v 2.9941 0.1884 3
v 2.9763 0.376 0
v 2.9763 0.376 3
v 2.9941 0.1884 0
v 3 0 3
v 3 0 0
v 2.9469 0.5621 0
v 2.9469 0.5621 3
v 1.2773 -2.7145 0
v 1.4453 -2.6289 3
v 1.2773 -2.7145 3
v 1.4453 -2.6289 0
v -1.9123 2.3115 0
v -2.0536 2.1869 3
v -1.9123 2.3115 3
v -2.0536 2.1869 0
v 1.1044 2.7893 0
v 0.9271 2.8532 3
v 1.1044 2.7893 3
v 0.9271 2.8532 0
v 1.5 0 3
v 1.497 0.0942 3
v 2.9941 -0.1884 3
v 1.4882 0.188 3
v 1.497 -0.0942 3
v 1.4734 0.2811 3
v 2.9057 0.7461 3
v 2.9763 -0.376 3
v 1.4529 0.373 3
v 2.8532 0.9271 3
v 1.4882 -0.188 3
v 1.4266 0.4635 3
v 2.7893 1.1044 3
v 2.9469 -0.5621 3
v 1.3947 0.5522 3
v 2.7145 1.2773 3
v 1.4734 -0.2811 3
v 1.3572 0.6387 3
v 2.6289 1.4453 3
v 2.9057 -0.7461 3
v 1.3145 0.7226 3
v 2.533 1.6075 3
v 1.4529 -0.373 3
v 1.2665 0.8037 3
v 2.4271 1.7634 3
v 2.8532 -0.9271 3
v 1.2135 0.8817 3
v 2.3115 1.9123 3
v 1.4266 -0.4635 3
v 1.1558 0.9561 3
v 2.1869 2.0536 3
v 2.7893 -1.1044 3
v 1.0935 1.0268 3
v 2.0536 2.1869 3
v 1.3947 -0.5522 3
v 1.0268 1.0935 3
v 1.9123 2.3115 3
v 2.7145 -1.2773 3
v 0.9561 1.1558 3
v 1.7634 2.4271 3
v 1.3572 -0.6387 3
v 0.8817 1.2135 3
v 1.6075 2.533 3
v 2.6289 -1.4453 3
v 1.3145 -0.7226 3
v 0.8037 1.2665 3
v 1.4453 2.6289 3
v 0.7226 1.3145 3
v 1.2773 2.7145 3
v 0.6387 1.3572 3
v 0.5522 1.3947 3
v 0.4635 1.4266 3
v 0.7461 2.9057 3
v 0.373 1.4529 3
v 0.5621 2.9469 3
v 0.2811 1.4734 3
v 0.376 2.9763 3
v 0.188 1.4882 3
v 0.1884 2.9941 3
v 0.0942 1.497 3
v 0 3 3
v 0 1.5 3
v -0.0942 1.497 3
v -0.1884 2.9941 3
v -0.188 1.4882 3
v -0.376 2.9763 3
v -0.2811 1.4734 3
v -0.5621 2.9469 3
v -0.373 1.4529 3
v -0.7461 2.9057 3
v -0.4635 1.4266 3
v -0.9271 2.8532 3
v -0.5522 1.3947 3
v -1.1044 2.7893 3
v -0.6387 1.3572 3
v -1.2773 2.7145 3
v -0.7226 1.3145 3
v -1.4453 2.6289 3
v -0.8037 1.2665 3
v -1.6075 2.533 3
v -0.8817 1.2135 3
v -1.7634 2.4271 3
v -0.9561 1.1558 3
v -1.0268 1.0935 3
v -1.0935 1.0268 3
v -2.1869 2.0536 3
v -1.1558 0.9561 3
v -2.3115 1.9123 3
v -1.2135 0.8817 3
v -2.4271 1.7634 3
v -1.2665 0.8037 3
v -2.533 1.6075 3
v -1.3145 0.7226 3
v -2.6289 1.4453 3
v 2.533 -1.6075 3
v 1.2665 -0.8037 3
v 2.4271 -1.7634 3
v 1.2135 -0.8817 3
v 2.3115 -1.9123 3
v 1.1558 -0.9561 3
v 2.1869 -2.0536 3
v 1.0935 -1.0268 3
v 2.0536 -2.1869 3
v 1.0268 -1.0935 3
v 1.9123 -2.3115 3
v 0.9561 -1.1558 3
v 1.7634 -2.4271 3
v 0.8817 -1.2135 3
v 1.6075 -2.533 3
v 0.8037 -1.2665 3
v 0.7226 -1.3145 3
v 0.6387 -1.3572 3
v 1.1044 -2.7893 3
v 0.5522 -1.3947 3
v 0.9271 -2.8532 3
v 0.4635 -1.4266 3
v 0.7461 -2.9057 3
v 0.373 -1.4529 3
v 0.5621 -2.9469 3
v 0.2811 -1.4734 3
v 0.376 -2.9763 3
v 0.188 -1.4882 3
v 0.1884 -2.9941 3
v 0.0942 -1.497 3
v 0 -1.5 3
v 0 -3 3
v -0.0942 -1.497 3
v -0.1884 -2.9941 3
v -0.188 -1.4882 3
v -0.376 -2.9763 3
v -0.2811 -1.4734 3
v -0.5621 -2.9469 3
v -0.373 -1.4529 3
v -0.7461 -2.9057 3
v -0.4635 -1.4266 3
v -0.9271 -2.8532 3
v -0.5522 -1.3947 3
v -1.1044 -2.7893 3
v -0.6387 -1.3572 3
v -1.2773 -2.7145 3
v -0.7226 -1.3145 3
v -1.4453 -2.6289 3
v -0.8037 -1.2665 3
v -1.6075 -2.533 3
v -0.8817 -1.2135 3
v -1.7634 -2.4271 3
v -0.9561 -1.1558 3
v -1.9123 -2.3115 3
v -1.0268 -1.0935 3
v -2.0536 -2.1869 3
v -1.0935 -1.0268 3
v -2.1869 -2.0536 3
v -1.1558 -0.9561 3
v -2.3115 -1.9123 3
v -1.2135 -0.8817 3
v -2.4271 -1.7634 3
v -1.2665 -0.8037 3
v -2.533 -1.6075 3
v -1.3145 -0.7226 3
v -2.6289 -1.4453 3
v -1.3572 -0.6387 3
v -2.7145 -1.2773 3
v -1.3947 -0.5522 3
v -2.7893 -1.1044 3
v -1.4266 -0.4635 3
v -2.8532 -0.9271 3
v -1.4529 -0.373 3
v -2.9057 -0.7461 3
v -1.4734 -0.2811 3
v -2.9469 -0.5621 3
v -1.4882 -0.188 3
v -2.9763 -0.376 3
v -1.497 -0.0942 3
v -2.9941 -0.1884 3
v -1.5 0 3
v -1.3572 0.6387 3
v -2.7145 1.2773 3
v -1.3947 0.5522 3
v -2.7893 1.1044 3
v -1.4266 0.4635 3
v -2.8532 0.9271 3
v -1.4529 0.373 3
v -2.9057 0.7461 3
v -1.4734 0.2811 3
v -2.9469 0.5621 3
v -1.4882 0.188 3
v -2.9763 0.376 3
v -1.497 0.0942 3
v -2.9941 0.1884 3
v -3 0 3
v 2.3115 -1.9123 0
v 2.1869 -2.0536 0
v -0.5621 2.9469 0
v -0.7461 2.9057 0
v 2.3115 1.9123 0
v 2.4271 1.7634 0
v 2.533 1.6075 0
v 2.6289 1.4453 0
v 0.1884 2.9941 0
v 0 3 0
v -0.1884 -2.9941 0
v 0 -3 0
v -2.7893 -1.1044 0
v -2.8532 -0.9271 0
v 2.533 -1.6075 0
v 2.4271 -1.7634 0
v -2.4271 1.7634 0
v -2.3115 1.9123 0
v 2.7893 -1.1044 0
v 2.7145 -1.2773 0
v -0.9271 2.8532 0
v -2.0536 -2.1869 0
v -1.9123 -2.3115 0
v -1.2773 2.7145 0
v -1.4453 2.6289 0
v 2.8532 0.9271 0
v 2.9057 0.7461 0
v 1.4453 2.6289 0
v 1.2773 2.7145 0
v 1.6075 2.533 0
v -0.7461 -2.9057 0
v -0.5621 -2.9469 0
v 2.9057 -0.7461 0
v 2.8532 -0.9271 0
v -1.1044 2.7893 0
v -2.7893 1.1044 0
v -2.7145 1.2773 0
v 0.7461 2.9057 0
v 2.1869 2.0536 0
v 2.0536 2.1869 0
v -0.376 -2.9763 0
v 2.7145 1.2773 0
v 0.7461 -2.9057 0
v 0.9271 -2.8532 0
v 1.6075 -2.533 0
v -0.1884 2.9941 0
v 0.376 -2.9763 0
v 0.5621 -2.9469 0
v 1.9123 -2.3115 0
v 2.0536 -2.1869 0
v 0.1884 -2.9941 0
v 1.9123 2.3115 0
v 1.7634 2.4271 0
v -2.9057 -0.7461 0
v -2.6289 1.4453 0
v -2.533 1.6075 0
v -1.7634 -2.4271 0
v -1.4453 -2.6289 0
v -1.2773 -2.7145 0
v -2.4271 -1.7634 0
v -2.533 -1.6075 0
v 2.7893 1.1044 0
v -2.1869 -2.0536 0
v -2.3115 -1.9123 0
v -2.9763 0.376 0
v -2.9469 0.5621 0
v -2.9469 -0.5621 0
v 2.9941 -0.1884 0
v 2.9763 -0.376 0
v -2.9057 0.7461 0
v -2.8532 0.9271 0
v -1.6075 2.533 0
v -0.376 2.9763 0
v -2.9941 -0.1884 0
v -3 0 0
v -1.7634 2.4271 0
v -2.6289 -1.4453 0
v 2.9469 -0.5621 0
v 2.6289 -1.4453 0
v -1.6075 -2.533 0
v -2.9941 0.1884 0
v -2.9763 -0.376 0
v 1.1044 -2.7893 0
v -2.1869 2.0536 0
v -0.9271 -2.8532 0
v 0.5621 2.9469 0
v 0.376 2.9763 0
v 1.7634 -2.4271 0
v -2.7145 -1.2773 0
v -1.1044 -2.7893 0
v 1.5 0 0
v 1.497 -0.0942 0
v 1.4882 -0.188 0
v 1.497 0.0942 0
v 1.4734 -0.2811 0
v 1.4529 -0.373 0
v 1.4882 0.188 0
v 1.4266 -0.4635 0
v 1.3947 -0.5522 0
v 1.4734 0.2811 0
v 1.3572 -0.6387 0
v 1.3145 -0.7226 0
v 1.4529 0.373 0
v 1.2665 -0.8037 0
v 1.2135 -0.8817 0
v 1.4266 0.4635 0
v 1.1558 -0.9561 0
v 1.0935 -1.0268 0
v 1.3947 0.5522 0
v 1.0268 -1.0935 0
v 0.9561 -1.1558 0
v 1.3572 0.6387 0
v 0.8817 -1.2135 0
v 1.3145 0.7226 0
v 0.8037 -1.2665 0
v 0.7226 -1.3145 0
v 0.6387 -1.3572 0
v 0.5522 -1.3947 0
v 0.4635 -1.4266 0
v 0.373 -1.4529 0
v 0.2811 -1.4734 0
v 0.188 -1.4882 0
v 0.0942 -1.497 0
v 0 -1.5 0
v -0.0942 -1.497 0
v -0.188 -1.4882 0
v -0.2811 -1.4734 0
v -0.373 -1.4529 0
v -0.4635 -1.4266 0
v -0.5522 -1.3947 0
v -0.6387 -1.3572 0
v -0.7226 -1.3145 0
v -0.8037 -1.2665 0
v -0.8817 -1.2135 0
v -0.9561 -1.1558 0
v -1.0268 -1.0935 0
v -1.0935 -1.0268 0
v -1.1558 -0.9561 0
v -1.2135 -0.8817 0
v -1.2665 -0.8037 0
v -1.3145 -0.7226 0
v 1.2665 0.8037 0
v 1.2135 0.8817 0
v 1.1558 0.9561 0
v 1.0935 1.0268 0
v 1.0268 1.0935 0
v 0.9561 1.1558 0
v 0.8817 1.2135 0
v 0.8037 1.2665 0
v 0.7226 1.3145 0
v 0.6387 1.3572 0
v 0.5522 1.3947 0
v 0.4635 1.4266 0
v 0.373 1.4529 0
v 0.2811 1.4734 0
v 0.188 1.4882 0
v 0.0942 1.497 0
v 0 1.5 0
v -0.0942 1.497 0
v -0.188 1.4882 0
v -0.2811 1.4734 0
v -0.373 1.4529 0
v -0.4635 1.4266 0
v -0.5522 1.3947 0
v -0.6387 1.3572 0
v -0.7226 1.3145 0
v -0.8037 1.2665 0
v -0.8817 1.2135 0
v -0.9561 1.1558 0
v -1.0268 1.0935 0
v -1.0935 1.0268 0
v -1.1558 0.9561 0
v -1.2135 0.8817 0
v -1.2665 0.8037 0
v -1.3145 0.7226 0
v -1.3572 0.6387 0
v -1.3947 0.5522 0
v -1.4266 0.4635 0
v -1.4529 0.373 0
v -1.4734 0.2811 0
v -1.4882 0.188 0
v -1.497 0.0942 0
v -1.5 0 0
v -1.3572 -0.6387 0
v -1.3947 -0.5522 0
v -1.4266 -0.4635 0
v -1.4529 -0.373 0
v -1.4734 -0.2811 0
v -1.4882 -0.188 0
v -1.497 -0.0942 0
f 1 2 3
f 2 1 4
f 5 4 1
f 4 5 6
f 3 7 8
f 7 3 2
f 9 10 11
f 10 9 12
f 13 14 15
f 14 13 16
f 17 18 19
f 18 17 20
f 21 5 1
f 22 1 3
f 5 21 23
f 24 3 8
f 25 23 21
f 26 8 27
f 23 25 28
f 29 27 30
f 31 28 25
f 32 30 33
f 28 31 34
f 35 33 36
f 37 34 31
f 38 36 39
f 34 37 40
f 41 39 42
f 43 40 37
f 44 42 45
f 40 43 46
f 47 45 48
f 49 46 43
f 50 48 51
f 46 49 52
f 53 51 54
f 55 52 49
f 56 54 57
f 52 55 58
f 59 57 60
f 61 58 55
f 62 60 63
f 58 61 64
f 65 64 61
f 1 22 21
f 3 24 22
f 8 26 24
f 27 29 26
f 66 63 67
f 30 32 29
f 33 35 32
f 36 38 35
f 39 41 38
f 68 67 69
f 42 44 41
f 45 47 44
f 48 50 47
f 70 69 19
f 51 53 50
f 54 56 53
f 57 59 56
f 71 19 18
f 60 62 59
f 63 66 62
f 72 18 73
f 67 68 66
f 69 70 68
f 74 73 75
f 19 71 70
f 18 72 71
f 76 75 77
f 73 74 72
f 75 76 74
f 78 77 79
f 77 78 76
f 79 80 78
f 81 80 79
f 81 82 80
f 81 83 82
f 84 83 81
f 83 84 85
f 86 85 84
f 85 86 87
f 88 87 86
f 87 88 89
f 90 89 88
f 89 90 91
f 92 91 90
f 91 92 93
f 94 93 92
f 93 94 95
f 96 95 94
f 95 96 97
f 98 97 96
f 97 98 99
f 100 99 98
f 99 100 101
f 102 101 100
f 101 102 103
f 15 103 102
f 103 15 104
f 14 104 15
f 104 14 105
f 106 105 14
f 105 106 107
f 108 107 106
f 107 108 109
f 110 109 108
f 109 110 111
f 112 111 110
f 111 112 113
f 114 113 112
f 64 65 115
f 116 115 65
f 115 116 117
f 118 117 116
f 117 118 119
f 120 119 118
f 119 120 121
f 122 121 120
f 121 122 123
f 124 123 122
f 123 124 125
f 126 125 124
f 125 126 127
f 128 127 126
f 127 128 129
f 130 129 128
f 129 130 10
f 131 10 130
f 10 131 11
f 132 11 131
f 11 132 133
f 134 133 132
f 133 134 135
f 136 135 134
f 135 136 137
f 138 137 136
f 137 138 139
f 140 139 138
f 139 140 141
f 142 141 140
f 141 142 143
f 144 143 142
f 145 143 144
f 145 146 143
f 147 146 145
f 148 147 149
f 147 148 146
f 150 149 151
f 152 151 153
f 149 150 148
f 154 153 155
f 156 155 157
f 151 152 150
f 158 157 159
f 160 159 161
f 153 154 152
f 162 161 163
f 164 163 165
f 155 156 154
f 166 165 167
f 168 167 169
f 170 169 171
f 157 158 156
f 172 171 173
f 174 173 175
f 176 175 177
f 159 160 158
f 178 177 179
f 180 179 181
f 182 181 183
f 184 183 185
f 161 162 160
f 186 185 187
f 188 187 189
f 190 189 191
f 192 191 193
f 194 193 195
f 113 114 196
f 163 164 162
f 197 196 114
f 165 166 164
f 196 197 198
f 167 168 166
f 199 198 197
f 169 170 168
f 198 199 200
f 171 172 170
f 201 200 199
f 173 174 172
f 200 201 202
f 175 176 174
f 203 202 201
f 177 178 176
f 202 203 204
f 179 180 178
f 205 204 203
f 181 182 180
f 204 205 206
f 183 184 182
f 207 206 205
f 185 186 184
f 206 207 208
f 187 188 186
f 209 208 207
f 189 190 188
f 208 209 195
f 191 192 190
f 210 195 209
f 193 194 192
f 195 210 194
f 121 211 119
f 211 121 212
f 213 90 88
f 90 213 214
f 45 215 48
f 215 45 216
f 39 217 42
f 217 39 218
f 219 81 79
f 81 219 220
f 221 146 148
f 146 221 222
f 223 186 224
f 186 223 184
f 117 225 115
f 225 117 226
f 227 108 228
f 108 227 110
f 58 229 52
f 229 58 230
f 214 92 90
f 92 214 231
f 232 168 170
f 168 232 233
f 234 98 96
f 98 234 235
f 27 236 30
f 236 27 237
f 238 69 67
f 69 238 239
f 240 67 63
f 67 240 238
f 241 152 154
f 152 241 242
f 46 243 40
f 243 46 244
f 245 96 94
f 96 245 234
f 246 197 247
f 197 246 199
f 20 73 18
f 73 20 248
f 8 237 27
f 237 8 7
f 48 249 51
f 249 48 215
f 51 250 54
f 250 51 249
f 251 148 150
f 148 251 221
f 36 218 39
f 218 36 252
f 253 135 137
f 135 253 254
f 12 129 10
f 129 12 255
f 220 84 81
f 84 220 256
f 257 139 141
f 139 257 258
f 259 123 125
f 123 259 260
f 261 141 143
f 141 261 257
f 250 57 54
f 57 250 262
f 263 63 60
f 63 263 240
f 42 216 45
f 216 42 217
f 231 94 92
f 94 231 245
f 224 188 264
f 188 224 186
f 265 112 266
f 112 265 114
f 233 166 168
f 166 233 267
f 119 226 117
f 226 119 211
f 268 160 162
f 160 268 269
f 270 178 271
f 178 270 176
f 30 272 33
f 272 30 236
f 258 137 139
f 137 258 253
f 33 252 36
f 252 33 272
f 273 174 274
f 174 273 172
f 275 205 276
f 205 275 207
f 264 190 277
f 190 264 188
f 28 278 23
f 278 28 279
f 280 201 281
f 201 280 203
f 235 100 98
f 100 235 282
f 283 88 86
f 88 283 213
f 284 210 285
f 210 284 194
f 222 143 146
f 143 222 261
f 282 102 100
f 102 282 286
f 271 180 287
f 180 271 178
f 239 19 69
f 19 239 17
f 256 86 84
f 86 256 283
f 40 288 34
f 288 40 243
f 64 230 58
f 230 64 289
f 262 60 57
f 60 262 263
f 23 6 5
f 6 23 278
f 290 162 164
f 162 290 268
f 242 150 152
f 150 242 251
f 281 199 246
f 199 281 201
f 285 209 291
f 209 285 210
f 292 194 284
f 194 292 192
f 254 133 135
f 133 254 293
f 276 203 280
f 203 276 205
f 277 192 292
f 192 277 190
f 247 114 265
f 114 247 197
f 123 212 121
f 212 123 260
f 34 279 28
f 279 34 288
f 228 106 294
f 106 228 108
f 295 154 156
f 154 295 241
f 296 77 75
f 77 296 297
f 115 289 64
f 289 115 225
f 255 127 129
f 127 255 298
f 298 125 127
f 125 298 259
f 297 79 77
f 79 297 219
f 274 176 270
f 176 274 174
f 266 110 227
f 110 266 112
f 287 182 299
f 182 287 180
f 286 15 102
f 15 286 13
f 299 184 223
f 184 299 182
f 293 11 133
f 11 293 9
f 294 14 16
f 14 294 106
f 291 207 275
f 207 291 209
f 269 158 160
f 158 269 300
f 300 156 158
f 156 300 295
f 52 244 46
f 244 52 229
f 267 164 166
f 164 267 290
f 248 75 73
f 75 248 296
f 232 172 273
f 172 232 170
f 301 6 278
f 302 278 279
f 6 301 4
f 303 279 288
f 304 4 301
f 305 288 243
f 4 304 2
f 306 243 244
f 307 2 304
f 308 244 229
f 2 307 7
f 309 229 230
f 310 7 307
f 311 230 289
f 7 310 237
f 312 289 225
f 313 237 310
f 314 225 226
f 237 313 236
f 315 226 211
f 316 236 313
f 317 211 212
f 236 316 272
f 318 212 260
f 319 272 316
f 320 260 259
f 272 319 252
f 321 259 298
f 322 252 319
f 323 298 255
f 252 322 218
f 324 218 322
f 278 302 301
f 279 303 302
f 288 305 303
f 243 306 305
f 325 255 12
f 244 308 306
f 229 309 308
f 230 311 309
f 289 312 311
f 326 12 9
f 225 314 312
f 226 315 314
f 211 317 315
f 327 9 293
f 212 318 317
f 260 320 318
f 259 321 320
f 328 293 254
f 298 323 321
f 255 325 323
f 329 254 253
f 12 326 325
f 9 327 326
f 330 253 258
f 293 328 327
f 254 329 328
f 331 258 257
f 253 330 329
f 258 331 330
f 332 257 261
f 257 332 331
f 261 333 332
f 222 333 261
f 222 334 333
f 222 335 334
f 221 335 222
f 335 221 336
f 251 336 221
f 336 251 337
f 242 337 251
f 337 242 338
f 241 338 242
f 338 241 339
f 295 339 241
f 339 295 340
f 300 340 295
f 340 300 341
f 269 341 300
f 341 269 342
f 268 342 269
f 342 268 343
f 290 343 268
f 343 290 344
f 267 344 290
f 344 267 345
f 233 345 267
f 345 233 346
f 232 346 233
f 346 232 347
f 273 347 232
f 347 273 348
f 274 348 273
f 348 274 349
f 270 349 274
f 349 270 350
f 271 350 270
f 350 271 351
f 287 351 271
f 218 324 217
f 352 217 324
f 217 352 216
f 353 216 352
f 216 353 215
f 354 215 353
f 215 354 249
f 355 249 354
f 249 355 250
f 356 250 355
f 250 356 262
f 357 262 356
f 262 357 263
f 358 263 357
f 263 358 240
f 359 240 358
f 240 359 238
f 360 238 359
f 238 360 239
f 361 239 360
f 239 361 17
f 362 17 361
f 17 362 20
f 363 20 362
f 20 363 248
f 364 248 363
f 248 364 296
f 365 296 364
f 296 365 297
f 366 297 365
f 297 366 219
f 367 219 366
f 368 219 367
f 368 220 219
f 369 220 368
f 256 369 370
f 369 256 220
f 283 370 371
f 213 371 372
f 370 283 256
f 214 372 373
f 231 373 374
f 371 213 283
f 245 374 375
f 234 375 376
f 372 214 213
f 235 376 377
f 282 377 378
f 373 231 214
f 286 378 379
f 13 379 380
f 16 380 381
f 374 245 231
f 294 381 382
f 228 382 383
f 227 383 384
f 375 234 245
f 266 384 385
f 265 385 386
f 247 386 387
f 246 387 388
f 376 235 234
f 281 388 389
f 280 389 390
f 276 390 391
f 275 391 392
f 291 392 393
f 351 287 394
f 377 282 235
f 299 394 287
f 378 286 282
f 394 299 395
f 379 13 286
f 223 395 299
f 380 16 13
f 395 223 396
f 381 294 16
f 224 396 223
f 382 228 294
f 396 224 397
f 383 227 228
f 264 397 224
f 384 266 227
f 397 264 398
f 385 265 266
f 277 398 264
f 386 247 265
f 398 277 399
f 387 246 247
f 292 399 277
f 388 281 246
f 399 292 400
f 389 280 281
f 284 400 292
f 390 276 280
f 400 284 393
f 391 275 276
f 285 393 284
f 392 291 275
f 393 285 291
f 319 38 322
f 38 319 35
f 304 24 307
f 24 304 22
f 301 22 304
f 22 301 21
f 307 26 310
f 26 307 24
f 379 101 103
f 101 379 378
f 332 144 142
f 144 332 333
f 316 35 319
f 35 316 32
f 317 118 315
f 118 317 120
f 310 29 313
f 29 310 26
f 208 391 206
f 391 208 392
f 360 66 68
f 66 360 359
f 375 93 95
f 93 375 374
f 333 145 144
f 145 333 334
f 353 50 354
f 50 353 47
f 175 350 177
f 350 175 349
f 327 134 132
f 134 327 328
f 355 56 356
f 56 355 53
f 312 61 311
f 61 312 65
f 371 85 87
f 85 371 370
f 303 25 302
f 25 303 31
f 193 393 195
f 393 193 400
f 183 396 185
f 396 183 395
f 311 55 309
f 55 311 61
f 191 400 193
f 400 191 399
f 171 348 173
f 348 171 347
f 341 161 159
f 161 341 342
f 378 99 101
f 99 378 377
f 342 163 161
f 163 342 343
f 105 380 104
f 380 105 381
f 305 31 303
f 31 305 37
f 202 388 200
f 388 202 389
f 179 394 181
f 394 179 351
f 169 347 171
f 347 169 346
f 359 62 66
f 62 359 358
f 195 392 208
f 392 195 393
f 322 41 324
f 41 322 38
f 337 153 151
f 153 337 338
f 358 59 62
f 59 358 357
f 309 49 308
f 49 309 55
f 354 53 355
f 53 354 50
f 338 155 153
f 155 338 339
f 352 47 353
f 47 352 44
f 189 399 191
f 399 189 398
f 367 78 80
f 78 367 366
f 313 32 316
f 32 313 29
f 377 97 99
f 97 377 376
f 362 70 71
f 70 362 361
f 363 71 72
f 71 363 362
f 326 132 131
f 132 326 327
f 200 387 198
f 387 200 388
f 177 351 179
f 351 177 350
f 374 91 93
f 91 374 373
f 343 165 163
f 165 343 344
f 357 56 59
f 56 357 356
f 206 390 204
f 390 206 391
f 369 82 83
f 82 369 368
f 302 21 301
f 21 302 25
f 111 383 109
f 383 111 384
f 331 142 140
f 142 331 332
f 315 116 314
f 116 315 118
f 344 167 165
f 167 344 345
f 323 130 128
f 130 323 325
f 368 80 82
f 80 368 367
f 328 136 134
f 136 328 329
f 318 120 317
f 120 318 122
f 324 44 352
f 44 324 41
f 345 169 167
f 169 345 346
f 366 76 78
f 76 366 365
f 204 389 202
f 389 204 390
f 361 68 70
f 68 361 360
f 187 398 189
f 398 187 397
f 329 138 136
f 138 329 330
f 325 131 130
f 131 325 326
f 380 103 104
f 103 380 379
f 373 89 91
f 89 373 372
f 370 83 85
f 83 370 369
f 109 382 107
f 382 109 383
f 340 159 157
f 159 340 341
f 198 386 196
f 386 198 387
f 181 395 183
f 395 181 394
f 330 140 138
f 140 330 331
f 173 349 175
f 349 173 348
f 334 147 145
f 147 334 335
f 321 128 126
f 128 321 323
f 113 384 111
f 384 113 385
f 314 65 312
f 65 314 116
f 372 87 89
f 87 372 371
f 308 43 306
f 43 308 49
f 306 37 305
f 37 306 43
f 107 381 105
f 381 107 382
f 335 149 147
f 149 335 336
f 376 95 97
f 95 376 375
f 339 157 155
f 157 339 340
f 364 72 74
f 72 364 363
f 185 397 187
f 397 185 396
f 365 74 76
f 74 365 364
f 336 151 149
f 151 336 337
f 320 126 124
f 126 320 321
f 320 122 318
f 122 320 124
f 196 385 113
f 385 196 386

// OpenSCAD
$fn = 100;
difference() {
    cylinder(d=6, h=3);
    cylinder(d=3, h=3);
}
